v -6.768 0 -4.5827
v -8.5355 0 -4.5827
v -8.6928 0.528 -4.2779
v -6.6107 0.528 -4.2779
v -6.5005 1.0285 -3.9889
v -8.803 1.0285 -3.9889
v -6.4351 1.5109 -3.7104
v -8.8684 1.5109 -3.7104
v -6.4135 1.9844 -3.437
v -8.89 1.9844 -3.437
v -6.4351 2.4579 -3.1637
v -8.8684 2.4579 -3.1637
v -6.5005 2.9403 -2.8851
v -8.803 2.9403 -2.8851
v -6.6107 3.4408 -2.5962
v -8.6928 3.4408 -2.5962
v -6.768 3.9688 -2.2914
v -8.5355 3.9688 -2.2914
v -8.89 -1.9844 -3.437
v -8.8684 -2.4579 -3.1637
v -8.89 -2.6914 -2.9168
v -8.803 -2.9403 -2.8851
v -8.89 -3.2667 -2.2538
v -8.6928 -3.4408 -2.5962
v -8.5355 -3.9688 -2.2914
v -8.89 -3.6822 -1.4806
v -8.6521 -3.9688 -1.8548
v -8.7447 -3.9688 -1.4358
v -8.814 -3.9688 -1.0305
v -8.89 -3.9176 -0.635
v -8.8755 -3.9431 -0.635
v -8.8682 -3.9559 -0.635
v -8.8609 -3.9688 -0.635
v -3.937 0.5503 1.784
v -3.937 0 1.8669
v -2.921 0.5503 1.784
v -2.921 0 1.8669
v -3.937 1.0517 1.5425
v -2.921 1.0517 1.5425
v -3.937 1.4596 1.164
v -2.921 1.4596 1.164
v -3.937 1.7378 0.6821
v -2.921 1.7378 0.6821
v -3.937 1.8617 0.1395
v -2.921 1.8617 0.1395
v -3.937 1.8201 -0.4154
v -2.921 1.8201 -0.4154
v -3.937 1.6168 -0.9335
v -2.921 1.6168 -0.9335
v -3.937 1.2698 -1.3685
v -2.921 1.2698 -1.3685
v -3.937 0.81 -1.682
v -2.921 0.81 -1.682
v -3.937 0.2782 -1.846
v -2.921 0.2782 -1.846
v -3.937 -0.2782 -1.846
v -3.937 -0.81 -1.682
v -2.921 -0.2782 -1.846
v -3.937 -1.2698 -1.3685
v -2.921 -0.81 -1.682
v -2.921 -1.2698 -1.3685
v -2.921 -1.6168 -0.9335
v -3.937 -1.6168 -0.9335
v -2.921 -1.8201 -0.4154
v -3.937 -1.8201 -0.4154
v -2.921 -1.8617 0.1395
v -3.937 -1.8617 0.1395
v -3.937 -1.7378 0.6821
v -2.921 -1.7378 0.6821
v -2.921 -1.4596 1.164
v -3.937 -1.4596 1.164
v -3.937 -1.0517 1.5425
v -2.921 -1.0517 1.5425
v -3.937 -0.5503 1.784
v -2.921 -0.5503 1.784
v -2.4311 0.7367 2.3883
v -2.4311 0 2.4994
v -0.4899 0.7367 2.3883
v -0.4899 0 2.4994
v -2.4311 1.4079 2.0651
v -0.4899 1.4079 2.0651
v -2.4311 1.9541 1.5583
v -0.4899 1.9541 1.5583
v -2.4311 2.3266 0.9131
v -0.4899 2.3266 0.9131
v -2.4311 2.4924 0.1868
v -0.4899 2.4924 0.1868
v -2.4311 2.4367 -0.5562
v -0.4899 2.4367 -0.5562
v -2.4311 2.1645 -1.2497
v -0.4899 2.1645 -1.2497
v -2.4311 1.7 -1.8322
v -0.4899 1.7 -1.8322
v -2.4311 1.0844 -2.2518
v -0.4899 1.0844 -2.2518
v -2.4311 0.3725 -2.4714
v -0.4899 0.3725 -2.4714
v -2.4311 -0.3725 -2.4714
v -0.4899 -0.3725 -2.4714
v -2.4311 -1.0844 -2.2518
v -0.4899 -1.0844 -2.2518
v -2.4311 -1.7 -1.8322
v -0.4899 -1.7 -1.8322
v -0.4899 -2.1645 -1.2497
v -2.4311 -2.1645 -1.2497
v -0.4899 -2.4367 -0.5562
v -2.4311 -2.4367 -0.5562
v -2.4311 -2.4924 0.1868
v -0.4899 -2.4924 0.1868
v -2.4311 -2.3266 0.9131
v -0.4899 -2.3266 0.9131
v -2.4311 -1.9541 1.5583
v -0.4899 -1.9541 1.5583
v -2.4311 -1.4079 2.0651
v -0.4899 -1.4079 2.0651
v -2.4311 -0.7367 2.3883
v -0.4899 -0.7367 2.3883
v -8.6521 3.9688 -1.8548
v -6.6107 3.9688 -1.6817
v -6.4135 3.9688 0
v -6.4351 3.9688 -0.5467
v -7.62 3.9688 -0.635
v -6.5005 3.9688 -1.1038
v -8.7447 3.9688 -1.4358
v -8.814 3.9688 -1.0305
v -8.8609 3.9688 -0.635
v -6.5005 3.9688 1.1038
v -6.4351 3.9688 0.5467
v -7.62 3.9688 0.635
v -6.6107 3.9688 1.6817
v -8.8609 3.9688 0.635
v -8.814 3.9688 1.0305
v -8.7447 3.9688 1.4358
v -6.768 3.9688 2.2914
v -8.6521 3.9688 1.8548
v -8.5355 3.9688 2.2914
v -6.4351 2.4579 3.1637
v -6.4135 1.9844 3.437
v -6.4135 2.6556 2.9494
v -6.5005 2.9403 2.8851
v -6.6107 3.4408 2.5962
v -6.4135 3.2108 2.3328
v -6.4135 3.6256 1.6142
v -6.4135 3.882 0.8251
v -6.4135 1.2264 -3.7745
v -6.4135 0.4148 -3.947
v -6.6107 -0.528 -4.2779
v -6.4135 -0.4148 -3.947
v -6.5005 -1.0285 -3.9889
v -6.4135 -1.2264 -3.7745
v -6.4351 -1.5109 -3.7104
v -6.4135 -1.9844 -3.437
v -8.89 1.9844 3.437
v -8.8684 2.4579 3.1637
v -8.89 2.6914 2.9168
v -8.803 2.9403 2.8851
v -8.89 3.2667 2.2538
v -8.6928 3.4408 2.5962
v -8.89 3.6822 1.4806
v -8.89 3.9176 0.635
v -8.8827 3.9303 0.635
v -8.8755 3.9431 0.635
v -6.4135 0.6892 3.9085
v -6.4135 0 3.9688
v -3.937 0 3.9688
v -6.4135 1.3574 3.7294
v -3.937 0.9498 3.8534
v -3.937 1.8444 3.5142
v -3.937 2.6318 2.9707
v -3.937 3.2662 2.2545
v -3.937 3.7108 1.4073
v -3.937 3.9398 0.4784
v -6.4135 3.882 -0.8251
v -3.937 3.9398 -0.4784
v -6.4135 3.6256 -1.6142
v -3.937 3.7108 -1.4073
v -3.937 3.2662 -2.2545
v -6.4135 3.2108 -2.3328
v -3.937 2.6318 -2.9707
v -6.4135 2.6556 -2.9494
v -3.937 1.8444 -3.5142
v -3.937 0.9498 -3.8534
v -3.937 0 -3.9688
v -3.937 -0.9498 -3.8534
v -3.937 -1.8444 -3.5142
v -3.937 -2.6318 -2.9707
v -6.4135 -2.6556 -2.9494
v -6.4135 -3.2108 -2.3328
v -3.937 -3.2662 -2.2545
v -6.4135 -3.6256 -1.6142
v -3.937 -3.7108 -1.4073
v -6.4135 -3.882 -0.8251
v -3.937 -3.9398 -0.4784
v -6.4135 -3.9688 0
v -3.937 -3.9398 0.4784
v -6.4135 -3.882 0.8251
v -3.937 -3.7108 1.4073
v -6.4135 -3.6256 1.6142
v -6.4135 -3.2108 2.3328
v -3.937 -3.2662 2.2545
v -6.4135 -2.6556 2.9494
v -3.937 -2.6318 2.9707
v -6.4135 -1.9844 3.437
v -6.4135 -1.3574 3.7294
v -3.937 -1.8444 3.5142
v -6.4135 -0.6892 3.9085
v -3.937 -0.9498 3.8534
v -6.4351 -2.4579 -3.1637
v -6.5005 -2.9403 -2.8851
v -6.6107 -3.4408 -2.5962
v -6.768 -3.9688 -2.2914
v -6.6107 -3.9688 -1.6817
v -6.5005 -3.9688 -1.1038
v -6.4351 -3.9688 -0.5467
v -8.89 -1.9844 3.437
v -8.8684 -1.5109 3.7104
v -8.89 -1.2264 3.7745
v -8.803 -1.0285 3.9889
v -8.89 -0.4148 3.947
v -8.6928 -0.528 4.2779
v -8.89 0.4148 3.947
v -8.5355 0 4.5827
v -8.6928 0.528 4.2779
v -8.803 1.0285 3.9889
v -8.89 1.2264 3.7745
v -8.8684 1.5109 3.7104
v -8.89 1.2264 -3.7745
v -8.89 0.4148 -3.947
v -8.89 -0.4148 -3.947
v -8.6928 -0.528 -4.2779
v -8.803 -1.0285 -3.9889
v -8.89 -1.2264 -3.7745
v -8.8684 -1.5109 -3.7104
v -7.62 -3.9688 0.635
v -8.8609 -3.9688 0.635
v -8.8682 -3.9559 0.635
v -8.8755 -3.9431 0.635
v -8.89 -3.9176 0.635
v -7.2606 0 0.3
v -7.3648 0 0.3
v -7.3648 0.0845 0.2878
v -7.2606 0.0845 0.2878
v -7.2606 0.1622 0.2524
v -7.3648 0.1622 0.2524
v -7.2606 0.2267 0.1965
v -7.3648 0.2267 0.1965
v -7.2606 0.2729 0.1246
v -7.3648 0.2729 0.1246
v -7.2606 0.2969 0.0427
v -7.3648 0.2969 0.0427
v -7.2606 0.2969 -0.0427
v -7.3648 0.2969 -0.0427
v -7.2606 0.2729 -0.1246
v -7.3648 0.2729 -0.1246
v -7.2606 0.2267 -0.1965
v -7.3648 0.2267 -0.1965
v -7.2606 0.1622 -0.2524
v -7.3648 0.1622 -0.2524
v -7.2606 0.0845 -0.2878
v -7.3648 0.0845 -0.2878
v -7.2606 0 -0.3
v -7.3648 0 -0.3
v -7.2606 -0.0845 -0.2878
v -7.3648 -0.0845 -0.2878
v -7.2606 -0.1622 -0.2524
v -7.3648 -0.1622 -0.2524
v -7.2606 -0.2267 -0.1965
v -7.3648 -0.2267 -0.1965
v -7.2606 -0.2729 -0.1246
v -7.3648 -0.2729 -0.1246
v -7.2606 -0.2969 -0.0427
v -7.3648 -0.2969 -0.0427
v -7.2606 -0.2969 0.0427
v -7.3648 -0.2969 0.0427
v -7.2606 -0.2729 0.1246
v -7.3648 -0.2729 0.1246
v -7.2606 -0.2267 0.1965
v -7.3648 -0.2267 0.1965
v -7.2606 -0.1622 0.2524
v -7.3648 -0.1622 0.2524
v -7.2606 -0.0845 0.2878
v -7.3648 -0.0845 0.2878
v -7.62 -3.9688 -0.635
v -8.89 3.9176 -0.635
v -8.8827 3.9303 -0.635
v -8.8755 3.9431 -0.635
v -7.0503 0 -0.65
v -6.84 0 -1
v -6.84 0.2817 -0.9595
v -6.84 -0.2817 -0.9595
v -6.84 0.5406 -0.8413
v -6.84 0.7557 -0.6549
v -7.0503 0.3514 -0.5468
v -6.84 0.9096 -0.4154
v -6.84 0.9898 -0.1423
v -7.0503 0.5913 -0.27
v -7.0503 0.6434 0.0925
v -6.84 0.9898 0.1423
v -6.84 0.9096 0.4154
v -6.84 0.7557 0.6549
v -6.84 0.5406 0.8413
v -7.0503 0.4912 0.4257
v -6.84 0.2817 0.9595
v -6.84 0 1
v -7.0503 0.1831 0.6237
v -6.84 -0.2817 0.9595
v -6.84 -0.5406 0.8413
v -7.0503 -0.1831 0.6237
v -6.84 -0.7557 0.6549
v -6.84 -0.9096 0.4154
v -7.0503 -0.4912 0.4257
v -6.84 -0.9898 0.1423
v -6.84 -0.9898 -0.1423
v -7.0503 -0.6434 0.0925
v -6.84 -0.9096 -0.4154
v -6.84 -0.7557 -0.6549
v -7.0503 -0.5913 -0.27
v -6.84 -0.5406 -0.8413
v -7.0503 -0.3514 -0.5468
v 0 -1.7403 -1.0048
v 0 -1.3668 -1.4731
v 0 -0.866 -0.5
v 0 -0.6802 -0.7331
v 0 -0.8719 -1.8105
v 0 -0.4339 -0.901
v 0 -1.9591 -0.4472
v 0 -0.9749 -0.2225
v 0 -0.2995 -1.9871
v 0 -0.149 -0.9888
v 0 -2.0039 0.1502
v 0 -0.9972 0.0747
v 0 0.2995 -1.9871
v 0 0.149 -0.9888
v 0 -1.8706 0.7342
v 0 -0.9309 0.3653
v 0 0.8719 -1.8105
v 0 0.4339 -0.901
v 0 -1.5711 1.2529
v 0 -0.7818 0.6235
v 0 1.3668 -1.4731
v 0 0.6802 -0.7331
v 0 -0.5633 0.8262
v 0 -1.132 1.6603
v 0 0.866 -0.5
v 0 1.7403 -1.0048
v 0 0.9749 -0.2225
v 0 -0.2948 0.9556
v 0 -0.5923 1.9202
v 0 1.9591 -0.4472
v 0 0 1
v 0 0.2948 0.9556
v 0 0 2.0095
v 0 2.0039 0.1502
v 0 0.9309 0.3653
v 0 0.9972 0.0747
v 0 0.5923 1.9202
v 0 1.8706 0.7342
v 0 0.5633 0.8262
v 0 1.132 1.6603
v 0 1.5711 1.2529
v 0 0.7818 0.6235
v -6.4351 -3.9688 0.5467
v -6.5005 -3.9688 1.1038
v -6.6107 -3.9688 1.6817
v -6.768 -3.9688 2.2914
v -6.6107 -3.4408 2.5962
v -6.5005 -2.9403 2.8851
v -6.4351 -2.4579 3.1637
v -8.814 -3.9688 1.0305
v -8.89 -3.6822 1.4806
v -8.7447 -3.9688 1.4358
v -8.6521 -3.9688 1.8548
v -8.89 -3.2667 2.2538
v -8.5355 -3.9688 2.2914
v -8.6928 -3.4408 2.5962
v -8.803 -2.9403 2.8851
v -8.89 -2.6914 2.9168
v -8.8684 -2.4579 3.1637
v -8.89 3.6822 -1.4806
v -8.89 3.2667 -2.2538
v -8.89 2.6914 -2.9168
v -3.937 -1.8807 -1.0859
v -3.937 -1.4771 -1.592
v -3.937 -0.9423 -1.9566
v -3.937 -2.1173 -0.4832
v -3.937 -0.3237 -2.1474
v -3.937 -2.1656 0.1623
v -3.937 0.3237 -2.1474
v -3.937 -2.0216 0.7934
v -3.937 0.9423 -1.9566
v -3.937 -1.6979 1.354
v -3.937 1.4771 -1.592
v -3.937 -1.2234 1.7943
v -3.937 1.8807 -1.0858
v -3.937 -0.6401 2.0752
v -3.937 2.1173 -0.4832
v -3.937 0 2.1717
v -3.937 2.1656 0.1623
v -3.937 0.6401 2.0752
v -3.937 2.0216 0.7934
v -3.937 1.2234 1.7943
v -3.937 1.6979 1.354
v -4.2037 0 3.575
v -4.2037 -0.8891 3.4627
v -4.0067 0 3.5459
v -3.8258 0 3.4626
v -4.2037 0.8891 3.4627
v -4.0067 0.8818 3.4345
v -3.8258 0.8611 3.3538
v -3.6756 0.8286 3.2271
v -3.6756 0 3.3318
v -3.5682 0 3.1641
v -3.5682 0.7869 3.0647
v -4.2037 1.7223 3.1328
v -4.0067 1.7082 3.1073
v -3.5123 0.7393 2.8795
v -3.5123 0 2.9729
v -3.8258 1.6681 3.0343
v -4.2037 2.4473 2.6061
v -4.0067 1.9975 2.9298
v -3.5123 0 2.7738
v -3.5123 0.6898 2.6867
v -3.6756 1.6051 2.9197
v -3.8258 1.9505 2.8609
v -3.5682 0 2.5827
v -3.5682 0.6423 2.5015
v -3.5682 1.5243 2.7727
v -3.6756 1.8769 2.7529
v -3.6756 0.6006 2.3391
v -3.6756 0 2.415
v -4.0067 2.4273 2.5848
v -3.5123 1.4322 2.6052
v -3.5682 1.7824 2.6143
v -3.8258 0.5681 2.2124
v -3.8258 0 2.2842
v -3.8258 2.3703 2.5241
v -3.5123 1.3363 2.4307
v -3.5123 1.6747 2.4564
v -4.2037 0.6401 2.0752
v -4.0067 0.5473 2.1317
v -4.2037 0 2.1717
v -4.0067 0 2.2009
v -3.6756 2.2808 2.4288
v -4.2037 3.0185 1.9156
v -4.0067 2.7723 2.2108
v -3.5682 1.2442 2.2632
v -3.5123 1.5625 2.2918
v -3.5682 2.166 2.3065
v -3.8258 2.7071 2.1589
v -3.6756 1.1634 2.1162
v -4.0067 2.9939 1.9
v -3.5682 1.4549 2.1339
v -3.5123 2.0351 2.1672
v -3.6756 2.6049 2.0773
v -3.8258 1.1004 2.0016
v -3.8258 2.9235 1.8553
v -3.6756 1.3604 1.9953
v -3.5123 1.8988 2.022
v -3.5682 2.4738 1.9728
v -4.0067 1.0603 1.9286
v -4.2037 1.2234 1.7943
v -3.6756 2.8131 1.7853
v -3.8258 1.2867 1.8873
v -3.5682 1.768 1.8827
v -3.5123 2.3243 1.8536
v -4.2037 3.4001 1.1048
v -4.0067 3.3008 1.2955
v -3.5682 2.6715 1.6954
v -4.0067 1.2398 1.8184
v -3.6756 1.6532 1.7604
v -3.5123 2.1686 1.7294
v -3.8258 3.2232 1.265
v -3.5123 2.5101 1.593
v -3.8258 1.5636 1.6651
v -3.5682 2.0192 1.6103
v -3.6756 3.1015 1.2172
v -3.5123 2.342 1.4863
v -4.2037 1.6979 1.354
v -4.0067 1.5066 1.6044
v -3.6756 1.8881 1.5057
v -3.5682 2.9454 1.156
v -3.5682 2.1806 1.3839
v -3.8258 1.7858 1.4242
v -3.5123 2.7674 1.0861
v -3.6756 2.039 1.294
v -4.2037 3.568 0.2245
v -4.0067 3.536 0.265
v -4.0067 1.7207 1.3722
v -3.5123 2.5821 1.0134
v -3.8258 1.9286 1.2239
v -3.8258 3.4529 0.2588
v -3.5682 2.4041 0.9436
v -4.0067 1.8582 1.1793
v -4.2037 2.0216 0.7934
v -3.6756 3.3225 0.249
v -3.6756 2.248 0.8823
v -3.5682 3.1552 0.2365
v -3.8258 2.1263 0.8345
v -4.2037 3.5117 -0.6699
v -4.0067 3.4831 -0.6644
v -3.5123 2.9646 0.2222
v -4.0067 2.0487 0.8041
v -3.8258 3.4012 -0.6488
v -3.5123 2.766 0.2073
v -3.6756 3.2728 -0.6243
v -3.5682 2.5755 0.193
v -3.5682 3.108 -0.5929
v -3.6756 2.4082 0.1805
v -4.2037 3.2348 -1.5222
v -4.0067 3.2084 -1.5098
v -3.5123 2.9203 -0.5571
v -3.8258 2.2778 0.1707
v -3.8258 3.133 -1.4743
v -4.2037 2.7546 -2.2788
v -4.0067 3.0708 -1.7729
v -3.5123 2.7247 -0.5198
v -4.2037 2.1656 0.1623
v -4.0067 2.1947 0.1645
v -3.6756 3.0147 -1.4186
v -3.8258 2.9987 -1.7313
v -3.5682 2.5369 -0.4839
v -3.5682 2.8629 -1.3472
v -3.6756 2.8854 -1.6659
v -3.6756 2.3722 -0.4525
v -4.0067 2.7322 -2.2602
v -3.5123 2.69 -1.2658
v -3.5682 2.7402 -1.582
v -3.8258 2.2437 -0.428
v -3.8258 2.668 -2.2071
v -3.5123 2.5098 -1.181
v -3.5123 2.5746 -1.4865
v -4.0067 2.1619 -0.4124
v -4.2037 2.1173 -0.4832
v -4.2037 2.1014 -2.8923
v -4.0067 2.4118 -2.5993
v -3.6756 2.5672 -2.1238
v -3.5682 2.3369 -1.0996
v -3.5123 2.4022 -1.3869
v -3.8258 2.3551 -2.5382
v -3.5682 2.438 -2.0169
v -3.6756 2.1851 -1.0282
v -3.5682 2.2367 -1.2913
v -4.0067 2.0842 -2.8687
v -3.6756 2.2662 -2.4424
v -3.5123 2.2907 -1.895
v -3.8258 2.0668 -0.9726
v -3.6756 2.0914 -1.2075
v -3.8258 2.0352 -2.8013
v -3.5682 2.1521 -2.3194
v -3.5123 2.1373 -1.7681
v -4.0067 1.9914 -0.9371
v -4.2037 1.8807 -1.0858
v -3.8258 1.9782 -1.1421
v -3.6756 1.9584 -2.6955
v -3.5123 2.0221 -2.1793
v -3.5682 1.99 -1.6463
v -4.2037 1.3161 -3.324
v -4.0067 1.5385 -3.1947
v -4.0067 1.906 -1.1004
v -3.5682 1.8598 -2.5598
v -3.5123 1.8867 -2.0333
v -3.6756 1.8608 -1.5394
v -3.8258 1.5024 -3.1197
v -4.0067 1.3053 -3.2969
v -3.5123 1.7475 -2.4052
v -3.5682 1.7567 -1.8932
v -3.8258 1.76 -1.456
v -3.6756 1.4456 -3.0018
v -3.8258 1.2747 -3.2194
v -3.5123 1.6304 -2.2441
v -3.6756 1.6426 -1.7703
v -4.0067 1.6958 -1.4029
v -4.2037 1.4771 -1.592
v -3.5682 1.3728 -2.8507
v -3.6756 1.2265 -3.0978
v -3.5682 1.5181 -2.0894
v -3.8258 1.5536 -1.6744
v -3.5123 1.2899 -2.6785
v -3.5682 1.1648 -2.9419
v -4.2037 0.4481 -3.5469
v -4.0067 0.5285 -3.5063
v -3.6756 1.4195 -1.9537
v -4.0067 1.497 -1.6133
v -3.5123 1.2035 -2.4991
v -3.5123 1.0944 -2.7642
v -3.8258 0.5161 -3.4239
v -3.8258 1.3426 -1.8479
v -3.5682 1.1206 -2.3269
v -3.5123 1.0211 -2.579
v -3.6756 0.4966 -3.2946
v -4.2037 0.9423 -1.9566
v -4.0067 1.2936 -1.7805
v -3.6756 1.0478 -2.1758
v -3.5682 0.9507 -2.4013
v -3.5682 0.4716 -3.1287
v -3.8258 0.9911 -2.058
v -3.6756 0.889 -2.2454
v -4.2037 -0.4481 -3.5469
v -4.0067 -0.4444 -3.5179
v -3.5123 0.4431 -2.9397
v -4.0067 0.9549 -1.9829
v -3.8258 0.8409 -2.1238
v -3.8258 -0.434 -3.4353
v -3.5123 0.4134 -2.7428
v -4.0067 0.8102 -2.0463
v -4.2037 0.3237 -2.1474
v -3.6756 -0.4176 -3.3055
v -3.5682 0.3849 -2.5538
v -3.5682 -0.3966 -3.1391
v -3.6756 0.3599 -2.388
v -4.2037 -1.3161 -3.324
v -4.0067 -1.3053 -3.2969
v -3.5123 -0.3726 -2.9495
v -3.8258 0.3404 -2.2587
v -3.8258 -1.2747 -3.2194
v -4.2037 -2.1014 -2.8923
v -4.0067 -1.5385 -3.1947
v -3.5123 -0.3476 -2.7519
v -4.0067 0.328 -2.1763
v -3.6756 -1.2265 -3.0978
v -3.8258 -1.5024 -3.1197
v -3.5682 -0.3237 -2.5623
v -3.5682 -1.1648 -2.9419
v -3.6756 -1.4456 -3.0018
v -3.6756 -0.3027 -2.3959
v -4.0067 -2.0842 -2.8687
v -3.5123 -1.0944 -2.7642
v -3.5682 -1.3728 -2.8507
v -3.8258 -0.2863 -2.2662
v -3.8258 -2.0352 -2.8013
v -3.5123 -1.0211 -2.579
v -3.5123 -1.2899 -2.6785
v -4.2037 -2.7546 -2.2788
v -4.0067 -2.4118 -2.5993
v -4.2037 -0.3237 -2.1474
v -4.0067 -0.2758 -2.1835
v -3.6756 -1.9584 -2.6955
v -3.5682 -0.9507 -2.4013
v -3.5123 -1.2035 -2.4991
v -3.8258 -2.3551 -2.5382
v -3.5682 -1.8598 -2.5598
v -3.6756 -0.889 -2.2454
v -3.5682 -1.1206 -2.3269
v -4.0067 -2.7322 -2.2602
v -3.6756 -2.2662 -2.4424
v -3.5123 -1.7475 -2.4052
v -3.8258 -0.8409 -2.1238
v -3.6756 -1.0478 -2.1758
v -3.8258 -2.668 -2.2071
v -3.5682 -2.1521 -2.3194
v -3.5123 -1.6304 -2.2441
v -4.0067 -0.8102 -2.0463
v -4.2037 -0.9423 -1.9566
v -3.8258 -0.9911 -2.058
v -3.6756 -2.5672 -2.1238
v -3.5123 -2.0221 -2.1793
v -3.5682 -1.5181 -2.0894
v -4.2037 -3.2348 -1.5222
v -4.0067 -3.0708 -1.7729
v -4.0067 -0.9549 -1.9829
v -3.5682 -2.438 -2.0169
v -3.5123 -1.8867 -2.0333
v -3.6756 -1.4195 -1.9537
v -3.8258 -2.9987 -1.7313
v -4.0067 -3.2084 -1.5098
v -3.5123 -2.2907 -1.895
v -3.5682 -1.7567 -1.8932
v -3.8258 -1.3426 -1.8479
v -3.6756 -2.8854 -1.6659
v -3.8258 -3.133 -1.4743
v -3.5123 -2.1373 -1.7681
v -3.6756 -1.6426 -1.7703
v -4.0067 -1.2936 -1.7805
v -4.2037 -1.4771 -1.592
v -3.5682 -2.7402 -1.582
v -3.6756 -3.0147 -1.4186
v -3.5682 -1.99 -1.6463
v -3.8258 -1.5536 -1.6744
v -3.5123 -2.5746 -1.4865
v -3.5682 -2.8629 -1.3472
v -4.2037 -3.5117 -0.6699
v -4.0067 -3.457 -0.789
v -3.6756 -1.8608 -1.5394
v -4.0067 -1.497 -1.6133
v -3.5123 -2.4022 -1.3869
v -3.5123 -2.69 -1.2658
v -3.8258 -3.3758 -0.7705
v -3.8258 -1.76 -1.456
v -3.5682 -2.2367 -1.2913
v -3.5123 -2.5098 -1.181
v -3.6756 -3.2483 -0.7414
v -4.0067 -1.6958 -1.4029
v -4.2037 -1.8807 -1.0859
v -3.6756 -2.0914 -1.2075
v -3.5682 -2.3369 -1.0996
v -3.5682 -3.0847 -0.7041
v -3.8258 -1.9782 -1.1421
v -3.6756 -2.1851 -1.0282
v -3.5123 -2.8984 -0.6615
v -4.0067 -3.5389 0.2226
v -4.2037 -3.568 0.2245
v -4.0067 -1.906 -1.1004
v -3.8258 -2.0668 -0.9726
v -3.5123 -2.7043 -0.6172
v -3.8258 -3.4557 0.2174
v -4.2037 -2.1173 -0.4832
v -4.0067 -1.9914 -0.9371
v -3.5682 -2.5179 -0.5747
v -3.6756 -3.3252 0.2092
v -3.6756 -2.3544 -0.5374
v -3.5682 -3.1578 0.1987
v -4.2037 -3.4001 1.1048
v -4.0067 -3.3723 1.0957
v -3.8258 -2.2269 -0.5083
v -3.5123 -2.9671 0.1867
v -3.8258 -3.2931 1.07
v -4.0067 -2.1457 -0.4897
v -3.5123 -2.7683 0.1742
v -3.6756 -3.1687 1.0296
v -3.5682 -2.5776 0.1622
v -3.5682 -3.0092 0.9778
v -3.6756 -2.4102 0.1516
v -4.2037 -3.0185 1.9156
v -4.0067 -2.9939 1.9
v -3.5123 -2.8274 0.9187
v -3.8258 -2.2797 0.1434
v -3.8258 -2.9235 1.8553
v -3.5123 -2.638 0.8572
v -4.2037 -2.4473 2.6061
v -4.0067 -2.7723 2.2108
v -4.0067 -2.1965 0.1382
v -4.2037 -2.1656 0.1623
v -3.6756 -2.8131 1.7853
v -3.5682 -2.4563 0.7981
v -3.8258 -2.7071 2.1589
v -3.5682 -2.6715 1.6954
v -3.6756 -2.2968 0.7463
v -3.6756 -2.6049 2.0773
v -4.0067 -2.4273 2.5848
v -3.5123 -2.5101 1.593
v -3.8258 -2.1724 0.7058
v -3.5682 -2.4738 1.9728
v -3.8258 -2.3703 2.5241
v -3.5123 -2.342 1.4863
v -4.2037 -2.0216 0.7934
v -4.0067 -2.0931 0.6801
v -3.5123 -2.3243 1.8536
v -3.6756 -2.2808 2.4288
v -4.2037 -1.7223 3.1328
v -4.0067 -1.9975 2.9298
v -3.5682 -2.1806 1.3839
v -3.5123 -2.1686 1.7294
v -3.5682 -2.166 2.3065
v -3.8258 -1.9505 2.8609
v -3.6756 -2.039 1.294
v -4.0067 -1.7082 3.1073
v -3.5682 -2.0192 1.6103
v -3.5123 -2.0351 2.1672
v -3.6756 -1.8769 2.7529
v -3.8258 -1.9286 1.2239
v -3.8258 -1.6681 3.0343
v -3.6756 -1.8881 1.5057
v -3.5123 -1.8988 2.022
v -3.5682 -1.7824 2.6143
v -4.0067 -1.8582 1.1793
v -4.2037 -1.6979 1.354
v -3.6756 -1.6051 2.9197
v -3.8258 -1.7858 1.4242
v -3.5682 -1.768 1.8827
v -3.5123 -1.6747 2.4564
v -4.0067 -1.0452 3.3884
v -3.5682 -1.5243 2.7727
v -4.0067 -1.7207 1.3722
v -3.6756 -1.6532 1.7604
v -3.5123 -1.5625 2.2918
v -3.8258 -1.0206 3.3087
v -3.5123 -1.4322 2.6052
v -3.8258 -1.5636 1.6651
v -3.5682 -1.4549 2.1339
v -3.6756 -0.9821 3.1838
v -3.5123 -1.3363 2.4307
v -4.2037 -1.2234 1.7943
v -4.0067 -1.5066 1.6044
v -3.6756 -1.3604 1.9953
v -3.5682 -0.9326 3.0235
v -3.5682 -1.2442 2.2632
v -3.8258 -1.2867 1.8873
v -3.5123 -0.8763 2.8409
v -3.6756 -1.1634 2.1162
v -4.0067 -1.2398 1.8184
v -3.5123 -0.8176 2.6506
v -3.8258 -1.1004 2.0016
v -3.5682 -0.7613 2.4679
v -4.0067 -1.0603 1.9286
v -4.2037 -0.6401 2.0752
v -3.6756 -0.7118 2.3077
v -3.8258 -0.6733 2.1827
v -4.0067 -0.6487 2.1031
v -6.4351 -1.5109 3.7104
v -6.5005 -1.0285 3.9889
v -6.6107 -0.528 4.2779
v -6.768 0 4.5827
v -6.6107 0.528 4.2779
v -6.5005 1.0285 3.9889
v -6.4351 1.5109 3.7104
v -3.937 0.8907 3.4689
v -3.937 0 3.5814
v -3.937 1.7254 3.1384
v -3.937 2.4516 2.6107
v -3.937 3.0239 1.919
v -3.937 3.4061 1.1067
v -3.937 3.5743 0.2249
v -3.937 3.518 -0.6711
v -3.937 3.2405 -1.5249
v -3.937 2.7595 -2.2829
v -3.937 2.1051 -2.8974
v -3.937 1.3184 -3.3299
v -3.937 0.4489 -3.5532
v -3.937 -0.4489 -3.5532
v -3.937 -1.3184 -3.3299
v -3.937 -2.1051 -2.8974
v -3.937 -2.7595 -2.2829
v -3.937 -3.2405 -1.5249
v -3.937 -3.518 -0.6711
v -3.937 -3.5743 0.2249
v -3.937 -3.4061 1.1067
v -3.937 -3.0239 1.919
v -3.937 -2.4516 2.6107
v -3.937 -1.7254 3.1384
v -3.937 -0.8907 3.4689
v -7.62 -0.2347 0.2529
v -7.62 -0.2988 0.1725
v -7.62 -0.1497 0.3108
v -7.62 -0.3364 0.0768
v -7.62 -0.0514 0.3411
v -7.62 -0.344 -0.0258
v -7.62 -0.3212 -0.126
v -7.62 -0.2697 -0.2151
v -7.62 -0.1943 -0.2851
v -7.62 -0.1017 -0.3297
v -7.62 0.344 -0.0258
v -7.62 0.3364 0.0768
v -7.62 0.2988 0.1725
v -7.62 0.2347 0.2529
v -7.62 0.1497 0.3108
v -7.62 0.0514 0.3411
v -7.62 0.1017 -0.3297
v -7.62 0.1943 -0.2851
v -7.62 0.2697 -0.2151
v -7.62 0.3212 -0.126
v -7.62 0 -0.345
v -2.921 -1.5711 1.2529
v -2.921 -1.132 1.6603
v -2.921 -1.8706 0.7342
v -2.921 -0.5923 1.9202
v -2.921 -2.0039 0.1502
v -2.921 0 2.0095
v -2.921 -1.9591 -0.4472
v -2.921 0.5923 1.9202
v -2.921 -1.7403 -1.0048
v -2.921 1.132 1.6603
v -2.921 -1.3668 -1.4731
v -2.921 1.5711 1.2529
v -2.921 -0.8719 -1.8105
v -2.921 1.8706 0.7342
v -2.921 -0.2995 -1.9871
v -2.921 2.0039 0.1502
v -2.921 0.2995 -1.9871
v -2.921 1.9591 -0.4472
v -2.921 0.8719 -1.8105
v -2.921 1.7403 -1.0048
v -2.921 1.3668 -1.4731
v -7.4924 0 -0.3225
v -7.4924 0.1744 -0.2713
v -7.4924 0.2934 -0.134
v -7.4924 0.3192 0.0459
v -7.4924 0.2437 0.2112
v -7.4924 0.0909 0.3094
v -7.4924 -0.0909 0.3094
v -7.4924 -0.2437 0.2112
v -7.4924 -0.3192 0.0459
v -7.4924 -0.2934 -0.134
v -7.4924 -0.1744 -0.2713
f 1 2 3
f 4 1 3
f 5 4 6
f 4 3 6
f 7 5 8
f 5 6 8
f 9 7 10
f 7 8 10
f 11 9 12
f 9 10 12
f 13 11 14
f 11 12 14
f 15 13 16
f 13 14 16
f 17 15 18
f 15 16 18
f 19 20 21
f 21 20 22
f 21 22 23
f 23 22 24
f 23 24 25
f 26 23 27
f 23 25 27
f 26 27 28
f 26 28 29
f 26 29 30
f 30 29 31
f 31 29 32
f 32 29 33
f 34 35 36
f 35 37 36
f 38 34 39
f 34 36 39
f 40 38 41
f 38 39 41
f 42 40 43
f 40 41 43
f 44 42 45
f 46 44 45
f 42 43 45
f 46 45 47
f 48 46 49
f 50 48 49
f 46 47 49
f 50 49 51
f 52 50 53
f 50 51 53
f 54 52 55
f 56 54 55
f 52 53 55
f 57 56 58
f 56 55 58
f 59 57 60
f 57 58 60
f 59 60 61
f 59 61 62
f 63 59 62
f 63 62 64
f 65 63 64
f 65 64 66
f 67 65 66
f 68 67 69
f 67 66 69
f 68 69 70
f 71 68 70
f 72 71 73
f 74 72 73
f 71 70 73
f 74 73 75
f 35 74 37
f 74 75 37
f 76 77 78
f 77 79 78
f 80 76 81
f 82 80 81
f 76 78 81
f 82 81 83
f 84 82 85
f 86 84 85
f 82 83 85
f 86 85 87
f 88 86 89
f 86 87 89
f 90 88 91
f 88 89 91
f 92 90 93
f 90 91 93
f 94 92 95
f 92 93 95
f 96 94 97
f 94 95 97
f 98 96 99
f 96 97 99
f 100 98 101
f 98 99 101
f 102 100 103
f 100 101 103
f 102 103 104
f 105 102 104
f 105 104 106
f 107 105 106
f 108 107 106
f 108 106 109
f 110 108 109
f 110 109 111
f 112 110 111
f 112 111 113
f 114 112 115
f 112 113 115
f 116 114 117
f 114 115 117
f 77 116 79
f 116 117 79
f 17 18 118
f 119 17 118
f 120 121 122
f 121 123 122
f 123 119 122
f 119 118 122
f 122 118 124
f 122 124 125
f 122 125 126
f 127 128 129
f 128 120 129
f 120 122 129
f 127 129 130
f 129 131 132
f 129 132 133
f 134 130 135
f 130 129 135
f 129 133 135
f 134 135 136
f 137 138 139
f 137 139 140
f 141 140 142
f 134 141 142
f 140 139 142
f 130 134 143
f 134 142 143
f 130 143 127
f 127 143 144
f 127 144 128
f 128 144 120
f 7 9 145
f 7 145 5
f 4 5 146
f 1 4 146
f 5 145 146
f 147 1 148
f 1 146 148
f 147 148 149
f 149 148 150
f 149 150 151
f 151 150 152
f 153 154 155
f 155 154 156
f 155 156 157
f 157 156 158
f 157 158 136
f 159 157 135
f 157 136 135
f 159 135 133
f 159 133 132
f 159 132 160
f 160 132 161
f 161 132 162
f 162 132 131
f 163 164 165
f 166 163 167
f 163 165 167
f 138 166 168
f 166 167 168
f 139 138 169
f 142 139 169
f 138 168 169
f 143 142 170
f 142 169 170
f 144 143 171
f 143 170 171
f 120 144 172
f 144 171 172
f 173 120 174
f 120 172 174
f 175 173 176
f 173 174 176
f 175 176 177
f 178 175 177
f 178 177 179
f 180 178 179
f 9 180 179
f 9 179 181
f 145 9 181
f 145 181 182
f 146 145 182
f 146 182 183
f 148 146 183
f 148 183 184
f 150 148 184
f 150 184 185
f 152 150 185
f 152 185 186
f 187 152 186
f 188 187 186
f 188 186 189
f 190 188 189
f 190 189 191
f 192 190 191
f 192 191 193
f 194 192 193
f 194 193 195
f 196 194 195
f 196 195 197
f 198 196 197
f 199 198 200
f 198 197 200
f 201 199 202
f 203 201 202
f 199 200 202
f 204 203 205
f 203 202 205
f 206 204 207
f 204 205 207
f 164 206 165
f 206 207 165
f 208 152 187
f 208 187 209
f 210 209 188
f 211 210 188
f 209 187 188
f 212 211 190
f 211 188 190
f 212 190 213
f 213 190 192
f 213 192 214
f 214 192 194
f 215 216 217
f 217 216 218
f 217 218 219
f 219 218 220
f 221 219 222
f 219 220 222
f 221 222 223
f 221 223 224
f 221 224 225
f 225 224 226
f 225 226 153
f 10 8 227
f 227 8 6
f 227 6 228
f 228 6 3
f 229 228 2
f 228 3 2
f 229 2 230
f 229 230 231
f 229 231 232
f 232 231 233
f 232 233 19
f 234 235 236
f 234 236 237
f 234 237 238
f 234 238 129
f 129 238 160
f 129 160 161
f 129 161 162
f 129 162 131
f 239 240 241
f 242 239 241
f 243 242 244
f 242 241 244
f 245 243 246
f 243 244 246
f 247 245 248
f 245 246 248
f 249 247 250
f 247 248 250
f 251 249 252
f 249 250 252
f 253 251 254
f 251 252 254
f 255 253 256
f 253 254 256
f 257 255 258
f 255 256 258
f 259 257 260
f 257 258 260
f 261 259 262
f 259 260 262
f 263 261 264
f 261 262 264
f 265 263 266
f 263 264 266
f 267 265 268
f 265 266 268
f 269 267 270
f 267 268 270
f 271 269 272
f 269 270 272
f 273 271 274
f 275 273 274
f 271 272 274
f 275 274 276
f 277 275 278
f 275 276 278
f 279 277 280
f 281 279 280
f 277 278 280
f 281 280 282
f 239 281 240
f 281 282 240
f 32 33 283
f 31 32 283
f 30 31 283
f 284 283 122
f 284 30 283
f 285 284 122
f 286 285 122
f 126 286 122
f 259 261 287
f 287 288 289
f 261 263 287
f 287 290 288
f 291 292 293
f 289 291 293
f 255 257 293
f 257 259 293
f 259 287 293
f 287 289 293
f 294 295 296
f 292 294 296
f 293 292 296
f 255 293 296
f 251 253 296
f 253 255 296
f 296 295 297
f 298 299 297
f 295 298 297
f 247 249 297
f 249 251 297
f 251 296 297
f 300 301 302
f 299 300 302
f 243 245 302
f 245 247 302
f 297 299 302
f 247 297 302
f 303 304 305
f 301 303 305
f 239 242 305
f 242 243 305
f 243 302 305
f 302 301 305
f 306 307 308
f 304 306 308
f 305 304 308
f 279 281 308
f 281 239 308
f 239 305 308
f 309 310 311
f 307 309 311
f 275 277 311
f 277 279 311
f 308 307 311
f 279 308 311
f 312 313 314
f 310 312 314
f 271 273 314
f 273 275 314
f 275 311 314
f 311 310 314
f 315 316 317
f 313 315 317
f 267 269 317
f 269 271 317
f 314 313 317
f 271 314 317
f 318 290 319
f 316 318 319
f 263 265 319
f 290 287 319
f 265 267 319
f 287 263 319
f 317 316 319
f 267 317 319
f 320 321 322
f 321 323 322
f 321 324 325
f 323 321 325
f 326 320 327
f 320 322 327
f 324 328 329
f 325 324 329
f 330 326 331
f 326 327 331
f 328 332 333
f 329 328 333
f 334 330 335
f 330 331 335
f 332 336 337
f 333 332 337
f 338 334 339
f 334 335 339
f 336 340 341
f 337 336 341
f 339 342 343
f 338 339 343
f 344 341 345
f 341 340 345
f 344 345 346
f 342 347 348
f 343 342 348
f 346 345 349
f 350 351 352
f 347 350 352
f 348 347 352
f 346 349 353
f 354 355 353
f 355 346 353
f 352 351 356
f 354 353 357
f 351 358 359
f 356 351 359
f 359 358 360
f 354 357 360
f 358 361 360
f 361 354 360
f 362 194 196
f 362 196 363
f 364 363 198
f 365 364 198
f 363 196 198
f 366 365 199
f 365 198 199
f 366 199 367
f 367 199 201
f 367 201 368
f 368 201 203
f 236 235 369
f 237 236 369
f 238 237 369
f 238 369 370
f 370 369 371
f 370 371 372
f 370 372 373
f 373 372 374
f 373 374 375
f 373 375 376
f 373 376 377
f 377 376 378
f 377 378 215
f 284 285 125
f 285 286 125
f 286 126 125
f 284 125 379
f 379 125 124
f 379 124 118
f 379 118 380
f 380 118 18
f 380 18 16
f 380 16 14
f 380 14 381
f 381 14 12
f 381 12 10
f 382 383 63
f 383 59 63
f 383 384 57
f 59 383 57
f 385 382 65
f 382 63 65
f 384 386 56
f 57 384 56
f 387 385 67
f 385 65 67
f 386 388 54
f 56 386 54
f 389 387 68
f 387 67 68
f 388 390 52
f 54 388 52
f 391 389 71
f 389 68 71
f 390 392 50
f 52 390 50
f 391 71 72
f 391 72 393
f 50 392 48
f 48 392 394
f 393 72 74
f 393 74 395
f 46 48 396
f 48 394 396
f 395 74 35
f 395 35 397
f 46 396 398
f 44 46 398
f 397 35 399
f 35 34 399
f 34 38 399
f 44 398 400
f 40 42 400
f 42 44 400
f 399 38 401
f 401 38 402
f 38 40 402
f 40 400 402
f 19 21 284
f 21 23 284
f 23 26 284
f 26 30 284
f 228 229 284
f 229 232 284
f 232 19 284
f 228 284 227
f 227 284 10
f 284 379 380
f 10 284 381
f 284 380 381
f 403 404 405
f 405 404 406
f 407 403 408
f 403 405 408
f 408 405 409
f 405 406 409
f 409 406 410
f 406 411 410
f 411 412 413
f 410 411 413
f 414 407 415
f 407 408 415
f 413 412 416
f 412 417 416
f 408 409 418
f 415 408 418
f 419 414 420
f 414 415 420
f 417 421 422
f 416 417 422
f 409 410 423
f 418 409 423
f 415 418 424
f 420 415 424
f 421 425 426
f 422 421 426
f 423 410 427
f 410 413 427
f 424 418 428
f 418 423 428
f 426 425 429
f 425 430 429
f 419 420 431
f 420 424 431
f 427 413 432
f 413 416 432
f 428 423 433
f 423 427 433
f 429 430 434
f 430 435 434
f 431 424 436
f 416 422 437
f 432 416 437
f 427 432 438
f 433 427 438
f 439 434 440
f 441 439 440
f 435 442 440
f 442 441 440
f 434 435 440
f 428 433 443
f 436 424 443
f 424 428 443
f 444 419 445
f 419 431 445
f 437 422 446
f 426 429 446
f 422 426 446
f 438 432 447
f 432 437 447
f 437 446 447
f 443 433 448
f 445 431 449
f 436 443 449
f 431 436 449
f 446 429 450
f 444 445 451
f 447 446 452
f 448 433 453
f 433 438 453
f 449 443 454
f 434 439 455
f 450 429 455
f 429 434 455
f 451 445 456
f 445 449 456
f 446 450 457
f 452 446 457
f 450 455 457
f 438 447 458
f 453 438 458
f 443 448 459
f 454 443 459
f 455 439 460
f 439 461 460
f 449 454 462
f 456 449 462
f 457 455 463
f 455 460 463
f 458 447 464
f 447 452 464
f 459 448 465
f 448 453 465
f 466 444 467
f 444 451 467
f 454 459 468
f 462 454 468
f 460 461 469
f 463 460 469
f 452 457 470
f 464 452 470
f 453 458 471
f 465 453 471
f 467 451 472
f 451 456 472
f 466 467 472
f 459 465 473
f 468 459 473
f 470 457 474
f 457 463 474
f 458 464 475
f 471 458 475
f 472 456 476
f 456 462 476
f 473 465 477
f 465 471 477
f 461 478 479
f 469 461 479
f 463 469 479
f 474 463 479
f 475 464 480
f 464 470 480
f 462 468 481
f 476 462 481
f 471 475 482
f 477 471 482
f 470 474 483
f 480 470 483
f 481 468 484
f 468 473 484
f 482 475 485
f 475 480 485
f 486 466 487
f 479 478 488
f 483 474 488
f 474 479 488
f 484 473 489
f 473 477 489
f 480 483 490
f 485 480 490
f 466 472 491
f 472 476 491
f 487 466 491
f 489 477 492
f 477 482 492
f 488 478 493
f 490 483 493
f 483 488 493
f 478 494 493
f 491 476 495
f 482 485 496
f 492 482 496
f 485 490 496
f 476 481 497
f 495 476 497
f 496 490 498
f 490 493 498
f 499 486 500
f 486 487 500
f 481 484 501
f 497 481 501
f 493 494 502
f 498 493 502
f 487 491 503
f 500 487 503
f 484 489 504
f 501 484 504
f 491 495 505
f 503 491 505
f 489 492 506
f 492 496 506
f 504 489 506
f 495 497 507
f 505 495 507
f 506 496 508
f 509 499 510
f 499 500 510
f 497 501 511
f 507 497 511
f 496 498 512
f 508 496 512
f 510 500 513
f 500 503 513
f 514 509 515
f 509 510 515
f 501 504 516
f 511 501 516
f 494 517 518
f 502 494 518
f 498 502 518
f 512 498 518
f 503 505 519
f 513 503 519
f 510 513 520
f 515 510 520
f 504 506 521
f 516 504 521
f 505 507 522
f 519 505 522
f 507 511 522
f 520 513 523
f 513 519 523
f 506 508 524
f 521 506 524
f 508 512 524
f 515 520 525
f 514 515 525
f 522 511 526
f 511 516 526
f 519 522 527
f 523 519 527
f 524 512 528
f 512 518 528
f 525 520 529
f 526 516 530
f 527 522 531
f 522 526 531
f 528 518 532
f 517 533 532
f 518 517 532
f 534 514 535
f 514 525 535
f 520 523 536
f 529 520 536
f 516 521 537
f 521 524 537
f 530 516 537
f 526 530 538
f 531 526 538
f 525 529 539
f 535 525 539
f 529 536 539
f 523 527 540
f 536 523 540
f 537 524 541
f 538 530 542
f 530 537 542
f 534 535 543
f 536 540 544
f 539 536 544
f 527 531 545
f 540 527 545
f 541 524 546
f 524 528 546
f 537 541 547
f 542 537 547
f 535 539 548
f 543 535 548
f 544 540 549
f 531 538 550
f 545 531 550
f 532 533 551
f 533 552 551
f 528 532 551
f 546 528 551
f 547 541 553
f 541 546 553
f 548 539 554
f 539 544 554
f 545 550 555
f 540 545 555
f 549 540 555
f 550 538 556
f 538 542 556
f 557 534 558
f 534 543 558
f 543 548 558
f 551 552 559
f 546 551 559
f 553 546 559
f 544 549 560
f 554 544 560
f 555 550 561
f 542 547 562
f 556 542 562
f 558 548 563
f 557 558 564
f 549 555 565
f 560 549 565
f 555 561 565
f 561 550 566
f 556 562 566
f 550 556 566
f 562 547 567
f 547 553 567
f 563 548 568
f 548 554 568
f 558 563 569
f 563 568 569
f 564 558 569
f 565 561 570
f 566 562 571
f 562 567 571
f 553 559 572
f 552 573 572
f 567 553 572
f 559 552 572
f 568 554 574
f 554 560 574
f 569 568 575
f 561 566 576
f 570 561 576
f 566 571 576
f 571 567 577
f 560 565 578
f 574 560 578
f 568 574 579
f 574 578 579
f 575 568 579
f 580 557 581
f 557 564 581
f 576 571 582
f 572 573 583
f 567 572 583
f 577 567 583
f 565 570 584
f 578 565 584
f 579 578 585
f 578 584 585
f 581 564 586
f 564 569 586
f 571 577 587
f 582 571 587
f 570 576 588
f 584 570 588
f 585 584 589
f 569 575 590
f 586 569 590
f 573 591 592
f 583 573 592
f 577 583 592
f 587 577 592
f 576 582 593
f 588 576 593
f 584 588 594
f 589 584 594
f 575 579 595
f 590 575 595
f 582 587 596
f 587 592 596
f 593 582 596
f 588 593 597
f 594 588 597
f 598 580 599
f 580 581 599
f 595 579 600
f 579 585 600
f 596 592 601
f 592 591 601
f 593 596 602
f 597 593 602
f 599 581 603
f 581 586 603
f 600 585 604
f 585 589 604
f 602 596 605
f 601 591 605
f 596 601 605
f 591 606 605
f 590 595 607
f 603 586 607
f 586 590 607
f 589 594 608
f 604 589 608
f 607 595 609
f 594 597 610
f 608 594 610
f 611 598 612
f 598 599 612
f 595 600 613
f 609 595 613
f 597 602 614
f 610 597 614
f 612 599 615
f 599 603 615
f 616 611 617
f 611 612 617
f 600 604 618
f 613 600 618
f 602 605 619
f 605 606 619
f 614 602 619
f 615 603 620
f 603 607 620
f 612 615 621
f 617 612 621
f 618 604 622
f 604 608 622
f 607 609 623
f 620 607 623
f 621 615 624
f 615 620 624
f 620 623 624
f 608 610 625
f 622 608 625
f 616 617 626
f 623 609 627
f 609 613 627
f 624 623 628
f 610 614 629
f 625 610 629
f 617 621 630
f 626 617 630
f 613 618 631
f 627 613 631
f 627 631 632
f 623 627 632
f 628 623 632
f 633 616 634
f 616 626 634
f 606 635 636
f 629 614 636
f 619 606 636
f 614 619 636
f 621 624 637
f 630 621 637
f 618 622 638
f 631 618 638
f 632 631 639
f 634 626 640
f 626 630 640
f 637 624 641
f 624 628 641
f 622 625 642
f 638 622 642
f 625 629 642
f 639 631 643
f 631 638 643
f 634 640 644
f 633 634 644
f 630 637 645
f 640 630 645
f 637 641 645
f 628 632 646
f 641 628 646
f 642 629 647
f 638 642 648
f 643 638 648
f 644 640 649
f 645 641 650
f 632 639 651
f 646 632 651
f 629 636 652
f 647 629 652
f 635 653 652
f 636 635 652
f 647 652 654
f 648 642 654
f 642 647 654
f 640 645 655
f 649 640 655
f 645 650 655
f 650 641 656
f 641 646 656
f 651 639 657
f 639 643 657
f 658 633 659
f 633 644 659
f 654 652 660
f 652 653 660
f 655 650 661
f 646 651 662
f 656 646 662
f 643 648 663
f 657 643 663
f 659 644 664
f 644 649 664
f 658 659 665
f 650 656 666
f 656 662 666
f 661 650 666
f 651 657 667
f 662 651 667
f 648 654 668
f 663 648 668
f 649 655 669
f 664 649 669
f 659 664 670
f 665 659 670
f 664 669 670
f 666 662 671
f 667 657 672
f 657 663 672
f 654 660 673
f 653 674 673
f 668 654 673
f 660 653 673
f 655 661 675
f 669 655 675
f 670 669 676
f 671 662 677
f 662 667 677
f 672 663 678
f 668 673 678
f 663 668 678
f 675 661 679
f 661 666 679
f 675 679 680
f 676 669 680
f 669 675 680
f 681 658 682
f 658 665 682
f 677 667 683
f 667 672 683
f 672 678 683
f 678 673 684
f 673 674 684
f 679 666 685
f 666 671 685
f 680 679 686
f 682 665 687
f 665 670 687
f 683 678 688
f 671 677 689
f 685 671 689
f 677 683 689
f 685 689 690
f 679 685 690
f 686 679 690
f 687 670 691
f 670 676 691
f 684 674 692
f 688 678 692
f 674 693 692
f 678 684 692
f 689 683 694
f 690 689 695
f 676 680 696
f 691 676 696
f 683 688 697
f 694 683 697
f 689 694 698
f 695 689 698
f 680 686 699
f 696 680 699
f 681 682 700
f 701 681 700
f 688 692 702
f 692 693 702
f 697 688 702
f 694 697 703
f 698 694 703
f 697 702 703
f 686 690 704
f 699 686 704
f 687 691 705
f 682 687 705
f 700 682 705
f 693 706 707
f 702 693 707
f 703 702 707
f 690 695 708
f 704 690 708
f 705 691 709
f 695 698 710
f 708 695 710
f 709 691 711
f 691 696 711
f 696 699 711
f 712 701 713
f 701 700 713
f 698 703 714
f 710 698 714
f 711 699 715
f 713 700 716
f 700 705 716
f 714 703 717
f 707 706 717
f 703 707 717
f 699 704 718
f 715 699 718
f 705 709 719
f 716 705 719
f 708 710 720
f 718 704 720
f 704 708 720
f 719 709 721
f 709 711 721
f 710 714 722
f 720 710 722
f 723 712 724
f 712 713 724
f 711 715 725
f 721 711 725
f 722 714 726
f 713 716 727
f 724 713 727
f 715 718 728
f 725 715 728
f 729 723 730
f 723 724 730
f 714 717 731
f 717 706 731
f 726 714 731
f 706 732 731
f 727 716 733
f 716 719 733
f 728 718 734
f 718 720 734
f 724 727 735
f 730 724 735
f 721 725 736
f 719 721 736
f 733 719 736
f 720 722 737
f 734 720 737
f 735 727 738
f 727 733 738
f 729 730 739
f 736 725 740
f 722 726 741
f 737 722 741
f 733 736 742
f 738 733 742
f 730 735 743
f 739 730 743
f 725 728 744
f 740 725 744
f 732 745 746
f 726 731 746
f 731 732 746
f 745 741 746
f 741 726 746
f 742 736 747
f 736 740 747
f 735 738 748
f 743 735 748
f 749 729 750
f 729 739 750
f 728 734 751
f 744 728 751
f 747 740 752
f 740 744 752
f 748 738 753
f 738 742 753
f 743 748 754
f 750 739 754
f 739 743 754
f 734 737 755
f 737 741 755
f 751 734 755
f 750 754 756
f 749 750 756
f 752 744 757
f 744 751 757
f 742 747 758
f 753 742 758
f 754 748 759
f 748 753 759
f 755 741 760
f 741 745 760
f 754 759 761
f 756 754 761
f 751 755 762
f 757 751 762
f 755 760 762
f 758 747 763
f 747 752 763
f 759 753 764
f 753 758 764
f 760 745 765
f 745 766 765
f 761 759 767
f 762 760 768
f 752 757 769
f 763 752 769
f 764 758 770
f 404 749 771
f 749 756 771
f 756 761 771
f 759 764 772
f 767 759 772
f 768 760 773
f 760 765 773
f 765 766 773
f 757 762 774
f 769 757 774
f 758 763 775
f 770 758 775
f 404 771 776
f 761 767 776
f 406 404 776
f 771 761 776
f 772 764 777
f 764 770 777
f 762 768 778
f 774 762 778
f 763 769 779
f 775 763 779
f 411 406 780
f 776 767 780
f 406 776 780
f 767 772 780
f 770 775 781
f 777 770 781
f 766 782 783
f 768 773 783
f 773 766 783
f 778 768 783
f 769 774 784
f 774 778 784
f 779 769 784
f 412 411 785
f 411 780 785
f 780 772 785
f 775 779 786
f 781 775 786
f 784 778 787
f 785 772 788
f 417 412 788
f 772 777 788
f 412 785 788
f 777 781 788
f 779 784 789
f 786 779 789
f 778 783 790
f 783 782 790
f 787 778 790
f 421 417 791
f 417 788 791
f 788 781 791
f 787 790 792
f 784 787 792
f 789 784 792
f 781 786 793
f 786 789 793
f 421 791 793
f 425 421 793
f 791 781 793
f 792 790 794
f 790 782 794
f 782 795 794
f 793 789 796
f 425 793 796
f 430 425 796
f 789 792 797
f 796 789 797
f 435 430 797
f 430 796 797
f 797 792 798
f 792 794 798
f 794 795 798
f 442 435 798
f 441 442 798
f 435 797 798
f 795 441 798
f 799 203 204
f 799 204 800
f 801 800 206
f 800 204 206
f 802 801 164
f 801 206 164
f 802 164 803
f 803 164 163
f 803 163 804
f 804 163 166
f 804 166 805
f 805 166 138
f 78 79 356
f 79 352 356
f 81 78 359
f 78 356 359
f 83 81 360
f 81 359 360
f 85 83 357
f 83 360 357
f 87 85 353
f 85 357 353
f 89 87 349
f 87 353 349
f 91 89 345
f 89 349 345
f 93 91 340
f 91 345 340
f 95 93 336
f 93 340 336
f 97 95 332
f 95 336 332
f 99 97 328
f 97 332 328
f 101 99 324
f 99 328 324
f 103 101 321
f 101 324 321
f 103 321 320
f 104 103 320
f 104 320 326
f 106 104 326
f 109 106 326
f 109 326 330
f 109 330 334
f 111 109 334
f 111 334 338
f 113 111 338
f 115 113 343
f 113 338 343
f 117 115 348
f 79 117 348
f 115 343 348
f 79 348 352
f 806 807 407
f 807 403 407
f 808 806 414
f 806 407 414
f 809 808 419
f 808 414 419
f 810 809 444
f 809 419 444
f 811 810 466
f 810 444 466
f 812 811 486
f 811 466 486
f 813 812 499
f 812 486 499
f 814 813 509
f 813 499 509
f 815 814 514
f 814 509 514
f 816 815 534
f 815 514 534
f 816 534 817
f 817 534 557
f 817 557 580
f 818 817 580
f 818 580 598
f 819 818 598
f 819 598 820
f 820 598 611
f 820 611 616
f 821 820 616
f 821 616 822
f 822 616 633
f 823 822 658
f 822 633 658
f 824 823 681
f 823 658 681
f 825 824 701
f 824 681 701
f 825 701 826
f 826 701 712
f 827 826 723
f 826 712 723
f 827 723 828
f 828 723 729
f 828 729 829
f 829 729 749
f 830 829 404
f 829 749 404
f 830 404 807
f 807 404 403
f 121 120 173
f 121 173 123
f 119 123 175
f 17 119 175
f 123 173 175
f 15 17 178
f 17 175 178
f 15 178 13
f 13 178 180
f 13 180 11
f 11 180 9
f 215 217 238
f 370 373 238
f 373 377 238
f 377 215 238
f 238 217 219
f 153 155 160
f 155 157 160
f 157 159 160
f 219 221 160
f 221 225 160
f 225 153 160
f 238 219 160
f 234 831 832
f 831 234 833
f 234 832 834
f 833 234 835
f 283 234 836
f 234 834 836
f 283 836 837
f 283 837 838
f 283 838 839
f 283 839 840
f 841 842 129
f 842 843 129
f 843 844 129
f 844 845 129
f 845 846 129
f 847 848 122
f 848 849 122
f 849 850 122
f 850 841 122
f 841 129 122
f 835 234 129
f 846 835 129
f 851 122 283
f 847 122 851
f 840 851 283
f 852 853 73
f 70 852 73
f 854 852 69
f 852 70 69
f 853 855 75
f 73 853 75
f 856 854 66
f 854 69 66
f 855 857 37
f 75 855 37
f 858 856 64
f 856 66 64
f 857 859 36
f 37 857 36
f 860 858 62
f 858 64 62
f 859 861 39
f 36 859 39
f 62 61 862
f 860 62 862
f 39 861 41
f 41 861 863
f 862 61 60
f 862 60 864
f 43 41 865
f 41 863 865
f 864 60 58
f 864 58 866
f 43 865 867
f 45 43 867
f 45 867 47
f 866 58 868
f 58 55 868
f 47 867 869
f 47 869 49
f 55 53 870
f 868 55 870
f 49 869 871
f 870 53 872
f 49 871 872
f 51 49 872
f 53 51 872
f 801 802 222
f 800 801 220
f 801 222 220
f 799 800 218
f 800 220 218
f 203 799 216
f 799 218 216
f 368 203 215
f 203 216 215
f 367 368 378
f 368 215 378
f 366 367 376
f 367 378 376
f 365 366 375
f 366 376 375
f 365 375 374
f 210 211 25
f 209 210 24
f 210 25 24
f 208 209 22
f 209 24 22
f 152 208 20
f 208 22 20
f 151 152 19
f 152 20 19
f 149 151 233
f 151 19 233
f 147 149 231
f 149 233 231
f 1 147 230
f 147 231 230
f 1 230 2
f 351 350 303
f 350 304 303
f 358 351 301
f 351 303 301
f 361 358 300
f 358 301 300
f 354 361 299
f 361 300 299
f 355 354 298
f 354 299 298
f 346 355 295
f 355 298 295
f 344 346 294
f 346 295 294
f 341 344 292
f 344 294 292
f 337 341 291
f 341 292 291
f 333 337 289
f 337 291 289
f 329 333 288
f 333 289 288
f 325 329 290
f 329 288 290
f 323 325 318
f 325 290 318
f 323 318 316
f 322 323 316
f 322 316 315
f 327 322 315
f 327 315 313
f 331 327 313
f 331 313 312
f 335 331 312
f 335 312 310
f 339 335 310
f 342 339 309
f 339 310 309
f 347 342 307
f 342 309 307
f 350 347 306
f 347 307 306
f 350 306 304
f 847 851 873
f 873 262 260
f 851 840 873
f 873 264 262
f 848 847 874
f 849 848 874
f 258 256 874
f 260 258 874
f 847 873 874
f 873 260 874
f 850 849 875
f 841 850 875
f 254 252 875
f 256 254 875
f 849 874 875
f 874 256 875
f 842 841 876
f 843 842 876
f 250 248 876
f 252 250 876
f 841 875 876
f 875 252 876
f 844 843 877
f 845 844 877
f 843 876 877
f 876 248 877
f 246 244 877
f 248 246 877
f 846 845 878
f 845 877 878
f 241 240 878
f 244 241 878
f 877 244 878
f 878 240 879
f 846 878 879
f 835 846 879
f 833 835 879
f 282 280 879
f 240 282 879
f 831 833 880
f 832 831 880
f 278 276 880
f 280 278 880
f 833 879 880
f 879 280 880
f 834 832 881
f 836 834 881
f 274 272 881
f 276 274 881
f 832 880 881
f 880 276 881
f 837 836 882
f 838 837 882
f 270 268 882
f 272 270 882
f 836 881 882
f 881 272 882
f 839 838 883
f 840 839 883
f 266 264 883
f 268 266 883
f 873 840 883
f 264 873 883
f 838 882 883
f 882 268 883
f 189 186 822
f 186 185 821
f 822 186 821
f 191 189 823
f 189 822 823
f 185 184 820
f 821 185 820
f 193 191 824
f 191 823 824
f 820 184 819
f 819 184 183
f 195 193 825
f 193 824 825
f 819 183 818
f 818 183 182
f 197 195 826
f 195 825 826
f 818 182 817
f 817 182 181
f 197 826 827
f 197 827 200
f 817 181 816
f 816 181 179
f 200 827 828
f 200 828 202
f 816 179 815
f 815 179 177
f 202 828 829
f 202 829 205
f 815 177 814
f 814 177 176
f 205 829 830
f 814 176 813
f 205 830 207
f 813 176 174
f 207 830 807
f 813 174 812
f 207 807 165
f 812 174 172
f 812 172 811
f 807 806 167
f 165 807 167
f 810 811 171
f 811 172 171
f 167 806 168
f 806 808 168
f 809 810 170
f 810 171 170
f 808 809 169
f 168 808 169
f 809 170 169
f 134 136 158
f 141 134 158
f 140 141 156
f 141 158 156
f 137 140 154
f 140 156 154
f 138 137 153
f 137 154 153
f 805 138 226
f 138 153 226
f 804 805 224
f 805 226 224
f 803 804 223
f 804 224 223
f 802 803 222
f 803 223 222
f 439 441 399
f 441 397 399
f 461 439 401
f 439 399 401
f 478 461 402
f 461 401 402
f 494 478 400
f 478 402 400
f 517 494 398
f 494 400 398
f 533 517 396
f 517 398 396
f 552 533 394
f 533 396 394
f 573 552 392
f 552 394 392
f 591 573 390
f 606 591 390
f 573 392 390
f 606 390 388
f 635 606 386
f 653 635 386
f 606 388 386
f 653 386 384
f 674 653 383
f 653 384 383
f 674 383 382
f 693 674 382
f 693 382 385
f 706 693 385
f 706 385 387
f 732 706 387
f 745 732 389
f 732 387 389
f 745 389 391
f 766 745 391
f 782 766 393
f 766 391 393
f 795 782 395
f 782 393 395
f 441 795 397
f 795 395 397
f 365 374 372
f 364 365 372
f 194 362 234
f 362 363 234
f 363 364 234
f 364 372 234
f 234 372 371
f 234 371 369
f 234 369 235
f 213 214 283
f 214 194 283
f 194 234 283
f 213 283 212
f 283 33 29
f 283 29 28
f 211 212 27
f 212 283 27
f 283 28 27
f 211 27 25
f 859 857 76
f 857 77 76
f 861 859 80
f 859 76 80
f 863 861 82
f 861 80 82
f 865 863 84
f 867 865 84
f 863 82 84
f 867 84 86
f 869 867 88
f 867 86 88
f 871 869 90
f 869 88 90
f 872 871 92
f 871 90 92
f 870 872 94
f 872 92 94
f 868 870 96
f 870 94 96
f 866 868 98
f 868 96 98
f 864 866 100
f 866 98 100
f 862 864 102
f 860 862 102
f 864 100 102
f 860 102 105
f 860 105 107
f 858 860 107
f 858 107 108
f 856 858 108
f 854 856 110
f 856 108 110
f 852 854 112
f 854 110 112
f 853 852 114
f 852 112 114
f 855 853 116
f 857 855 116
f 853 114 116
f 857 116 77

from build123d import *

# Parameters (mm, degrees)
SKETCH3_W                    = 15.875
SKETCH3_H                    = 15.875
CUT_EXTRUDE1_DEPTH           = 4.953
SKETCH4_W                    = 1.27
SKETCH4_H                    = 7.9375
CUT_EXTRUDE2_DEPTH           = 1.27
F_0_6_0_6_DIAMETER_HOLE1_D   = 0.6
F_2_0_2_DIAMETER_HOLE1_D     = 2
F_2_0_2_DIAMETER_HOLE1_DEPTH = 6.84
F_2_0_2_DIAMETER_HOLE1_TIP   = 0.600860619


with BuildPart() as part:
    # Sketch1 → Revolve1 (revolve)
    with BuildSketch(Plane.XY):
        Polygon((-3.937, 0), (-3.937, 1.8669), (-2.921, 1.8669), (-2.921, 2.0095), (-2.43114, 2.49936), (-0.48986, 2.49936), (0, 2.0095), (0, 0), align=None)
    revolve(axis=Axis((0, 0, 0), (-1, 0, 0)))

    # Sketch2 → Revolve2 (revolve)
    with BuildSketch(Plane.XY):
        with BuildLine():
            Line((-8.89, 0), (-8.89, 3.96875))
            Line((-8.89, 3.96875), (-8.126213706, 5.291666667))
            Line((-8.126213706, 5.291666667), (-7.177286294, 5.291666667))
            Line((-7.177286294, 5.291666667), (-6.4135, 3.96875))
            Line((-6.4135, 3.96875), (-3.937, 3.96875))
            Line((-3.937, 3.96875), (-3.937, 3.5814))
            Line((-3.937, 3.5814), (-4.2037, 3.57505))
            ThreePointArc((-4.2037, 3.57505), (-3.505192817, 2.873375), (-4.2037, 2.1717))
            Line((-4.2037, 2.1717), (-3.937, 2.1717))
            Line((-3.937, 2.1717), (-3.937, 0))
            Line((-3.937, 0), (-8.89, 0))
        make_face()
    revolve(axis=Axis((-3.937, 0, 0), (-1, 0, 0)))

    # Sketch3 → Cut-Extrude1 (cut)
    with BuildSketch(Plane(origin=(-8.89, 0, 0), x_dir=(0, 0, -1), z_dir=(1, 0, 0))):
        Rectangle(SKETCH3_W, SKETCH3_H)
        Polygon((-4.582717762, 0), (-2.291358881, -3.96875), (2.291358881, -3.96875), (4.582717762, 0), (2.291358881, 3.96875), (-2.291358881, 3.96875), align=None, mode=Mode.SUBTRACT)
    extrude(amount=CUT_EXTRUDE1_DEPTH, mode=Mode.SUBTRACT)

    # Sketch4 → Cut-Extrude2 (cut)
    with BuildSketch(Plane(origin=(-8.89, 0, 0), x_dir=(0, 0, -1), z_dir=(1, 0, 0))):
        Rectangle(SKETCH4_W, SKETCH4_H)
    extrude(amount=CUT_EXTRUDE2_DEPTH, mode=Mode.SUBTRACT)

    # Ø0.6 (0.6) Diameter Hole1 (through all)
    with Locations(Plane(origin=(0, 0, 0), x_dir=(0, 0, -1), z_dir=(1, 0, 0))):
        with Locations((0, 0)):
            Hole(F_0_6_0_6_DIAMETER_HOLE1_D / 2)

    # Sketch10 → Cut-Revolve2 (revolve, cut)
    with BuildSketch(Plane.XY):
        Polygon((-11.84818619, 1.090543305), (-5.946971863, 0.05), (-5.946971863, 0), (-11.84818619, 0), align=None)
    revolve(axis=Axis((0, 0, 0), (1, 0, 0)), mode=Mode.SUBTRACT)

    # Ø2.0 (2) Diameter Hole1
    with Locations(Plane(origin=(0, 0, 0), x_dir=(0, 0, -1), z_dir=(1, 0, 0))):
        with Locations((0, 0)):
            Hole(F_2_0_2_DIAMETER_HOLE1_D / 2, depth=F_2_0_2_DIAMETER_HOLE1_DEPTH)
            with Locations((0, 0, -(F_2_0_2_DIAMETER_HOLE1_DEPTH + F_2_0_2_DIAMETER_HOLE1_TIP / 2))):  # 118° drill point
                Cone(0, F_2_0_2_DIAMETER_HOLE1_D / 2, F_2_0_2_DIAMETER_HOLE1_TIP, mode=Mode.SUBTRACT)


solid = part.part
